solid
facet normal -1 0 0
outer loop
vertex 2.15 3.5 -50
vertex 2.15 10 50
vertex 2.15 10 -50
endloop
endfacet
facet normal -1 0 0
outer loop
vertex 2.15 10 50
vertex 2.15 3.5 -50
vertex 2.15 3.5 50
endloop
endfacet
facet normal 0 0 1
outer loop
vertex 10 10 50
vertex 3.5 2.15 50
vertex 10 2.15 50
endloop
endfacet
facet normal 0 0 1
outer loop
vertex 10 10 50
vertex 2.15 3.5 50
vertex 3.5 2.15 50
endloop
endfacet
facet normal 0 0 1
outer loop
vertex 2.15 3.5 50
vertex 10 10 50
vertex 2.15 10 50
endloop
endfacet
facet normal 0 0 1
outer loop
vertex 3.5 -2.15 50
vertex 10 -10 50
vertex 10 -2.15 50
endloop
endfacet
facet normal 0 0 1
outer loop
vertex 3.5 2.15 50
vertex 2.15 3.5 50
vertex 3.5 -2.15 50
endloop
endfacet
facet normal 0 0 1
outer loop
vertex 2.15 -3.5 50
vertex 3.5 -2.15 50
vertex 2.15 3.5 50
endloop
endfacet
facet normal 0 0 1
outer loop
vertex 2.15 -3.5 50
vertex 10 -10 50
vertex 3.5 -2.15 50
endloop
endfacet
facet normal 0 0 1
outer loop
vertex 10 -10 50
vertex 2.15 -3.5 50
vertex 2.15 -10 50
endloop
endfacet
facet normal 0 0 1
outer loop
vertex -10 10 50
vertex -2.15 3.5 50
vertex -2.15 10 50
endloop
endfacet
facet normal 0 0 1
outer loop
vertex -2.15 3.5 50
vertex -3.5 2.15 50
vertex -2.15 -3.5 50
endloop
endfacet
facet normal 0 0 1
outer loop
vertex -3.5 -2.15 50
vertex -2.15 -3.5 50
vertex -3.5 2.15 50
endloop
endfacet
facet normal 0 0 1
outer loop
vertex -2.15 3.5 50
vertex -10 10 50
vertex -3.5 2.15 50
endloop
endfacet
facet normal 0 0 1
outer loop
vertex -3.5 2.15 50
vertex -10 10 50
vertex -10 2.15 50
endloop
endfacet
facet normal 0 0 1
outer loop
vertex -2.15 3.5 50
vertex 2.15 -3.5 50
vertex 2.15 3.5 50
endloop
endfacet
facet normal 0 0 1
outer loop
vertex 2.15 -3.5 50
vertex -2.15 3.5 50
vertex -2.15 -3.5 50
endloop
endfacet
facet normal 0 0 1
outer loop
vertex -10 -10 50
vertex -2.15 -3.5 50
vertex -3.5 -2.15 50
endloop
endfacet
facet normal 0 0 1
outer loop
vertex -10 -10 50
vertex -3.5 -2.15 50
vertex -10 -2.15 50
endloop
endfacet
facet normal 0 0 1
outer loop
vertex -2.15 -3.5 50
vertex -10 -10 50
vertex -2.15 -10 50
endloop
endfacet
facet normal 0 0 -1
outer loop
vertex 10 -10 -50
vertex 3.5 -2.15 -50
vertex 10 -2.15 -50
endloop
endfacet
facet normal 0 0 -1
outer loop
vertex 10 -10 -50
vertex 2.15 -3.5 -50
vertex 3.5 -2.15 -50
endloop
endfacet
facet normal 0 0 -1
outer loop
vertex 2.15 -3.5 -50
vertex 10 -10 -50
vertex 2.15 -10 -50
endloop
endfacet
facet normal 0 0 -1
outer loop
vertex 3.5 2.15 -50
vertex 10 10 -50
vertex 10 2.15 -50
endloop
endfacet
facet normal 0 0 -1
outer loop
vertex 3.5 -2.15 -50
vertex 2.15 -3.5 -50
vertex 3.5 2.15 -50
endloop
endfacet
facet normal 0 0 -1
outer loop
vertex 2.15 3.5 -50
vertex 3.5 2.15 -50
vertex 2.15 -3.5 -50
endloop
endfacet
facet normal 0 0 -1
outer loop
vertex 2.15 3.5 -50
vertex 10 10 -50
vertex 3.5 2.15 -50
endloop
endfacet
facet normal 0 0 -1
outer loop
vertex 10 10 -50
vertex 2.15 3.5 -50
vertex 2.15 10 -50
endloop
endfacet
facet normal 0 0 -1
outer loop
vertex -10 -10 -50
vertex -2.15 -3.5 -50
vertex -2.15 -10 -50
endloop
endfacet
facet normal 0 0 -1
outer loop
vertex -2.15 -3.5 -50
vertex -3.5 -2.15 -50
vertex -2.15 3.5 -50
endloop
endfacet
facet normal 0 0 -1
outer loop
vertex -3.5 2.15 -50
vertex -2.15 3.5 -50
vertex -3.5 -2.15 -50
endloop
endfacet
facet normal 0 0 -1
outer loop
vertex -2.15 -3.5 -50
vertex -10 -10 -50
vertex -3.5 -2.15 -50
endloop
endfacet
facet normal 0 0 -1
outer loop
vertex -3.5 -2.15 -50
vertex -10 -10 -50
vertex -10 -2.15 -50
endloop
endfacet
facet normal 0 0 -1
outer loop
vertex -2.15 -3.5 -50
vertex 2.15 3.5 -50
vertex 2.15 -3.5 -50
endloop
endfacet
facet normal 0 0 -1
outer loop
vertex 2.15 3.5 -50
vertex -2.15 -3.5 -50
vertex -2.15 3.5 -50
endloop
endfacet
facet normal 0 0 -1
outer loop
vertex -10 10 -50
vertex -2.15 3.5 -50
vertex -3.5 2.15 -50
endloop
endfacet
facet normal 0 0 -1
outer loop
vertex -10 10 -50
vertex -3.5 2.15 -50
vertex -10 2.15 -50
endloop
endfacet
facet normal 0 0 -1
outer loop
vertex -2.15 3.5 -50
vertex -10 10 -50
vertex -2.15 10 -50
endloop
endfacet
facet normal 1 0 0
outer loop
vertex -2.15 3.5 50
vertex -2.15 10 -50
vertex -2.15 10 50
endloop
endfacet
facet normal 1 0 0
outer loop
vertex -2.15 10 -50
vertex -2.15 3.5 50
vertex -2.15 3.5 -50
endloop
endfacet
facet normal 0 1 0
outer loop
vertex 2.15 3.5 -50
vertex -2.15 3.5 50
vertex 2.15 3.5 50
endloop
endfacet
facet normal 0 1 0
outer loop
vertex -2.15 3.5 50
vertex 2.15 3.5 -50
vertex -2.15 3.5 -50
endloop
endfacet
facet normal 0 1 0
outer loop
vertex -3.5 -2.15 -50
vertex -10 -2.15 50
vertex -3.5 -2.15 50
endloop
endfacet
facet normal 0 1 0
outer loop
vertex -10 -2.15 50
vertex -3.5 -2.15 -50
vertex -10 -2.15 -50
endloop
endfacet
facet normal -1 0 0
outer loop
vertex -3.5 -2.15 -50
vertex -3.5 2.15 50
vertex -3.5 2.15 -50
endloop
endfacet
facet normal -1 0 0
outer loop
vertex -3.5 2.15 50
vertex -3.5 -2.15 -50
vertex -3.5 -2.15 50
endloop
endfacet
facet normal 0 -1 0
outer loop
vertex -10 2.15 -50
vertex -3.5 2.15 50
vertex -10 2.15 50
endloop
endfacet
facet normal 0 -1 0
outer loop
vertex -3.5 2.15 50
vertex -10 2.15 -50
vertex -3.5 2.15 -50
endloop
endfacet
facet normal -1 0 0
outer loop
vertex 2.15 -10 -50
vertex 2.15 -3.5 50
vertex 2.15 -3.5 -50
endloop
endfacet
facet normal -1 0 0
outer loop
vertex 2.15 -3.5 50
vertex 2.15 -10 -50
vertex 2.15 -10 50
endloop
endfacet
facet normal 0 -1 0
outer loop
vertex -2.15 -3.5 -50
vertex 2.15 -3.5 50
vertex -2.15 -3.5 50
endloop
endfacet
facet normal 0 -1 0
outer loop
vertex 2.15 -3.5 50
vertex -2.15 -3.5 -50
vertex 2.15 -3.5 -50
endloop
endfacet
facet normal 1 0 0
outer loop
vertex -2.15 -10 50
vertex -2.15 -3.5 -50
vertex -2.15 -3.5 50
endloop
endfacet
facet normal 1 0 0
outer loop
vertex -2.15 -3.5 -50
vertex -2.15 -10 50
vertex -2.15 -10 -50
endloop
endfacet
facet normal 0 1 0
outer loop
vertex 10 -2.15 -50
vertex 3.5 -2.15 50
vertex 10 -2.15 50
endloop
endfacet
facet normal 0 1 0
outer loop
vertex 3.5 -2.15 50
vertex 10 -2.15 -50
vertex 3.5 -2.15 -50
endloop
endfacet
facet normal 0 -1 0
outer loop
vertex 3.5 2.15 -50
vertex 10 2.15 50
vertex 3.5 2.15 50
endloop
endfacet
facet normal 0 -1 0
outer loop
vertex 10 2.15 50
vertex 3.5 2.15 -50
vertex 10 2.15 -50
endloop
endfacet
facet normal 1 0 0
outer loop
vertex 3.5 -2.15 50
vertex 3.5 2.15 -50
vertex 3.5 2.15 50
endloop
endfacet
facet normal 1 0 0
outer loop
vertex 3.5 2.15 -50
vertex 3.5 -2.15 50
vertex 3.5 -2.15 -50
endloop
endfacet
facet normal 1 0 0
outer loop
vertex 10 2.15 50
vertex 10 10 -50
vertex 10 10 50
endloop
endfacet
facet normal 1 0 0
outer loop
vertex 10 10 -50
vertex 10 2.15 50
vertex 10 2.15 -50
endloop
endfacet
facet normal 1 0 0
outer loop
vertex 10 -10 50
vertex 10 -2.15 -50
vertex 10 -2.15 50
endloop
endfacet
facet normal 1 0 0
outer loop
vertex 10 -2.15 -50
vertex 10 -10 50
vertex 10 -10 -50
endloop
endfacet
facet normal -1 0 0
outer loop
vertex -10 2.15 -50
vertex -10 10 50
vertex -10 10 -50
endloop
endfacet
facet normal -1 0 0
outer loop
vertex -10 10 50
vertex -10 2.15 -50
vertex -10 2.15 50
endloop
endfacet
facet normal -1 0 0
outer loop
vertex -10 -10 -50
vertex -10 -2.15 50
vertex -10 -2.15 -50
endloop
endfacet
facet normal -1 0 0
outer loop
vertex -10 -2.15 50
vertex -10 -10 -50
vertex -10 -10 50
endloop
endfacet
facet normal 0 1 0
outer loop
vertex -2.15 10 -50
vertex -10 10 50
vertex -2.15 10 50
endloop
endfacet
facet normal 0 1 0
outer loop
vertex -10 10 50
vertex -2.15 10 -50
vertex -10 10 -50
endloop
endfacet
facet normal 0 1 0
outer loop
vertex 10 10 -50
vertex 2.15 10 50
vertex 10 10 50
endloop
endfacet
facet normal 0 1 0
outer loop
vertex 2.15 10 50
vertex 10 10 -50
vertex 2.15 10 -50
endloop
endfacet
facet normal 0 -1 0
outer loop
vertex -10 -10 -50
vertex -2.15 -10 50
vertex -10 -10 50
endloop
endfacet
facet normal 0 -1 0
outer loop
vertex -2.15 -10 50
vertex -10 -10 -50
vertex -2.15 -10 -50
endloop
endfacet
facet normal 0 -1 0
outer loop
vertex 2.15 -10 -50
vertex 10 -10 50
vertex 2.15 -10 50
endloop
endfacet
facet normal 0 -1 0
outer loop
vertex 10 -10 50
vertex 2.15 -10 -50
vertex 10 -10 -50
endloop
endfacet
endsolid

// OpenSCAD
h = 100;
difference(){
  cube(size=[20,20,h],center=true);
  for(rot = [0,90,180,180+90]){
    rotate([0,0,rot])translate([0,10-3,0])cube(size=[4.3,7,h],center=true);    
  }
}
